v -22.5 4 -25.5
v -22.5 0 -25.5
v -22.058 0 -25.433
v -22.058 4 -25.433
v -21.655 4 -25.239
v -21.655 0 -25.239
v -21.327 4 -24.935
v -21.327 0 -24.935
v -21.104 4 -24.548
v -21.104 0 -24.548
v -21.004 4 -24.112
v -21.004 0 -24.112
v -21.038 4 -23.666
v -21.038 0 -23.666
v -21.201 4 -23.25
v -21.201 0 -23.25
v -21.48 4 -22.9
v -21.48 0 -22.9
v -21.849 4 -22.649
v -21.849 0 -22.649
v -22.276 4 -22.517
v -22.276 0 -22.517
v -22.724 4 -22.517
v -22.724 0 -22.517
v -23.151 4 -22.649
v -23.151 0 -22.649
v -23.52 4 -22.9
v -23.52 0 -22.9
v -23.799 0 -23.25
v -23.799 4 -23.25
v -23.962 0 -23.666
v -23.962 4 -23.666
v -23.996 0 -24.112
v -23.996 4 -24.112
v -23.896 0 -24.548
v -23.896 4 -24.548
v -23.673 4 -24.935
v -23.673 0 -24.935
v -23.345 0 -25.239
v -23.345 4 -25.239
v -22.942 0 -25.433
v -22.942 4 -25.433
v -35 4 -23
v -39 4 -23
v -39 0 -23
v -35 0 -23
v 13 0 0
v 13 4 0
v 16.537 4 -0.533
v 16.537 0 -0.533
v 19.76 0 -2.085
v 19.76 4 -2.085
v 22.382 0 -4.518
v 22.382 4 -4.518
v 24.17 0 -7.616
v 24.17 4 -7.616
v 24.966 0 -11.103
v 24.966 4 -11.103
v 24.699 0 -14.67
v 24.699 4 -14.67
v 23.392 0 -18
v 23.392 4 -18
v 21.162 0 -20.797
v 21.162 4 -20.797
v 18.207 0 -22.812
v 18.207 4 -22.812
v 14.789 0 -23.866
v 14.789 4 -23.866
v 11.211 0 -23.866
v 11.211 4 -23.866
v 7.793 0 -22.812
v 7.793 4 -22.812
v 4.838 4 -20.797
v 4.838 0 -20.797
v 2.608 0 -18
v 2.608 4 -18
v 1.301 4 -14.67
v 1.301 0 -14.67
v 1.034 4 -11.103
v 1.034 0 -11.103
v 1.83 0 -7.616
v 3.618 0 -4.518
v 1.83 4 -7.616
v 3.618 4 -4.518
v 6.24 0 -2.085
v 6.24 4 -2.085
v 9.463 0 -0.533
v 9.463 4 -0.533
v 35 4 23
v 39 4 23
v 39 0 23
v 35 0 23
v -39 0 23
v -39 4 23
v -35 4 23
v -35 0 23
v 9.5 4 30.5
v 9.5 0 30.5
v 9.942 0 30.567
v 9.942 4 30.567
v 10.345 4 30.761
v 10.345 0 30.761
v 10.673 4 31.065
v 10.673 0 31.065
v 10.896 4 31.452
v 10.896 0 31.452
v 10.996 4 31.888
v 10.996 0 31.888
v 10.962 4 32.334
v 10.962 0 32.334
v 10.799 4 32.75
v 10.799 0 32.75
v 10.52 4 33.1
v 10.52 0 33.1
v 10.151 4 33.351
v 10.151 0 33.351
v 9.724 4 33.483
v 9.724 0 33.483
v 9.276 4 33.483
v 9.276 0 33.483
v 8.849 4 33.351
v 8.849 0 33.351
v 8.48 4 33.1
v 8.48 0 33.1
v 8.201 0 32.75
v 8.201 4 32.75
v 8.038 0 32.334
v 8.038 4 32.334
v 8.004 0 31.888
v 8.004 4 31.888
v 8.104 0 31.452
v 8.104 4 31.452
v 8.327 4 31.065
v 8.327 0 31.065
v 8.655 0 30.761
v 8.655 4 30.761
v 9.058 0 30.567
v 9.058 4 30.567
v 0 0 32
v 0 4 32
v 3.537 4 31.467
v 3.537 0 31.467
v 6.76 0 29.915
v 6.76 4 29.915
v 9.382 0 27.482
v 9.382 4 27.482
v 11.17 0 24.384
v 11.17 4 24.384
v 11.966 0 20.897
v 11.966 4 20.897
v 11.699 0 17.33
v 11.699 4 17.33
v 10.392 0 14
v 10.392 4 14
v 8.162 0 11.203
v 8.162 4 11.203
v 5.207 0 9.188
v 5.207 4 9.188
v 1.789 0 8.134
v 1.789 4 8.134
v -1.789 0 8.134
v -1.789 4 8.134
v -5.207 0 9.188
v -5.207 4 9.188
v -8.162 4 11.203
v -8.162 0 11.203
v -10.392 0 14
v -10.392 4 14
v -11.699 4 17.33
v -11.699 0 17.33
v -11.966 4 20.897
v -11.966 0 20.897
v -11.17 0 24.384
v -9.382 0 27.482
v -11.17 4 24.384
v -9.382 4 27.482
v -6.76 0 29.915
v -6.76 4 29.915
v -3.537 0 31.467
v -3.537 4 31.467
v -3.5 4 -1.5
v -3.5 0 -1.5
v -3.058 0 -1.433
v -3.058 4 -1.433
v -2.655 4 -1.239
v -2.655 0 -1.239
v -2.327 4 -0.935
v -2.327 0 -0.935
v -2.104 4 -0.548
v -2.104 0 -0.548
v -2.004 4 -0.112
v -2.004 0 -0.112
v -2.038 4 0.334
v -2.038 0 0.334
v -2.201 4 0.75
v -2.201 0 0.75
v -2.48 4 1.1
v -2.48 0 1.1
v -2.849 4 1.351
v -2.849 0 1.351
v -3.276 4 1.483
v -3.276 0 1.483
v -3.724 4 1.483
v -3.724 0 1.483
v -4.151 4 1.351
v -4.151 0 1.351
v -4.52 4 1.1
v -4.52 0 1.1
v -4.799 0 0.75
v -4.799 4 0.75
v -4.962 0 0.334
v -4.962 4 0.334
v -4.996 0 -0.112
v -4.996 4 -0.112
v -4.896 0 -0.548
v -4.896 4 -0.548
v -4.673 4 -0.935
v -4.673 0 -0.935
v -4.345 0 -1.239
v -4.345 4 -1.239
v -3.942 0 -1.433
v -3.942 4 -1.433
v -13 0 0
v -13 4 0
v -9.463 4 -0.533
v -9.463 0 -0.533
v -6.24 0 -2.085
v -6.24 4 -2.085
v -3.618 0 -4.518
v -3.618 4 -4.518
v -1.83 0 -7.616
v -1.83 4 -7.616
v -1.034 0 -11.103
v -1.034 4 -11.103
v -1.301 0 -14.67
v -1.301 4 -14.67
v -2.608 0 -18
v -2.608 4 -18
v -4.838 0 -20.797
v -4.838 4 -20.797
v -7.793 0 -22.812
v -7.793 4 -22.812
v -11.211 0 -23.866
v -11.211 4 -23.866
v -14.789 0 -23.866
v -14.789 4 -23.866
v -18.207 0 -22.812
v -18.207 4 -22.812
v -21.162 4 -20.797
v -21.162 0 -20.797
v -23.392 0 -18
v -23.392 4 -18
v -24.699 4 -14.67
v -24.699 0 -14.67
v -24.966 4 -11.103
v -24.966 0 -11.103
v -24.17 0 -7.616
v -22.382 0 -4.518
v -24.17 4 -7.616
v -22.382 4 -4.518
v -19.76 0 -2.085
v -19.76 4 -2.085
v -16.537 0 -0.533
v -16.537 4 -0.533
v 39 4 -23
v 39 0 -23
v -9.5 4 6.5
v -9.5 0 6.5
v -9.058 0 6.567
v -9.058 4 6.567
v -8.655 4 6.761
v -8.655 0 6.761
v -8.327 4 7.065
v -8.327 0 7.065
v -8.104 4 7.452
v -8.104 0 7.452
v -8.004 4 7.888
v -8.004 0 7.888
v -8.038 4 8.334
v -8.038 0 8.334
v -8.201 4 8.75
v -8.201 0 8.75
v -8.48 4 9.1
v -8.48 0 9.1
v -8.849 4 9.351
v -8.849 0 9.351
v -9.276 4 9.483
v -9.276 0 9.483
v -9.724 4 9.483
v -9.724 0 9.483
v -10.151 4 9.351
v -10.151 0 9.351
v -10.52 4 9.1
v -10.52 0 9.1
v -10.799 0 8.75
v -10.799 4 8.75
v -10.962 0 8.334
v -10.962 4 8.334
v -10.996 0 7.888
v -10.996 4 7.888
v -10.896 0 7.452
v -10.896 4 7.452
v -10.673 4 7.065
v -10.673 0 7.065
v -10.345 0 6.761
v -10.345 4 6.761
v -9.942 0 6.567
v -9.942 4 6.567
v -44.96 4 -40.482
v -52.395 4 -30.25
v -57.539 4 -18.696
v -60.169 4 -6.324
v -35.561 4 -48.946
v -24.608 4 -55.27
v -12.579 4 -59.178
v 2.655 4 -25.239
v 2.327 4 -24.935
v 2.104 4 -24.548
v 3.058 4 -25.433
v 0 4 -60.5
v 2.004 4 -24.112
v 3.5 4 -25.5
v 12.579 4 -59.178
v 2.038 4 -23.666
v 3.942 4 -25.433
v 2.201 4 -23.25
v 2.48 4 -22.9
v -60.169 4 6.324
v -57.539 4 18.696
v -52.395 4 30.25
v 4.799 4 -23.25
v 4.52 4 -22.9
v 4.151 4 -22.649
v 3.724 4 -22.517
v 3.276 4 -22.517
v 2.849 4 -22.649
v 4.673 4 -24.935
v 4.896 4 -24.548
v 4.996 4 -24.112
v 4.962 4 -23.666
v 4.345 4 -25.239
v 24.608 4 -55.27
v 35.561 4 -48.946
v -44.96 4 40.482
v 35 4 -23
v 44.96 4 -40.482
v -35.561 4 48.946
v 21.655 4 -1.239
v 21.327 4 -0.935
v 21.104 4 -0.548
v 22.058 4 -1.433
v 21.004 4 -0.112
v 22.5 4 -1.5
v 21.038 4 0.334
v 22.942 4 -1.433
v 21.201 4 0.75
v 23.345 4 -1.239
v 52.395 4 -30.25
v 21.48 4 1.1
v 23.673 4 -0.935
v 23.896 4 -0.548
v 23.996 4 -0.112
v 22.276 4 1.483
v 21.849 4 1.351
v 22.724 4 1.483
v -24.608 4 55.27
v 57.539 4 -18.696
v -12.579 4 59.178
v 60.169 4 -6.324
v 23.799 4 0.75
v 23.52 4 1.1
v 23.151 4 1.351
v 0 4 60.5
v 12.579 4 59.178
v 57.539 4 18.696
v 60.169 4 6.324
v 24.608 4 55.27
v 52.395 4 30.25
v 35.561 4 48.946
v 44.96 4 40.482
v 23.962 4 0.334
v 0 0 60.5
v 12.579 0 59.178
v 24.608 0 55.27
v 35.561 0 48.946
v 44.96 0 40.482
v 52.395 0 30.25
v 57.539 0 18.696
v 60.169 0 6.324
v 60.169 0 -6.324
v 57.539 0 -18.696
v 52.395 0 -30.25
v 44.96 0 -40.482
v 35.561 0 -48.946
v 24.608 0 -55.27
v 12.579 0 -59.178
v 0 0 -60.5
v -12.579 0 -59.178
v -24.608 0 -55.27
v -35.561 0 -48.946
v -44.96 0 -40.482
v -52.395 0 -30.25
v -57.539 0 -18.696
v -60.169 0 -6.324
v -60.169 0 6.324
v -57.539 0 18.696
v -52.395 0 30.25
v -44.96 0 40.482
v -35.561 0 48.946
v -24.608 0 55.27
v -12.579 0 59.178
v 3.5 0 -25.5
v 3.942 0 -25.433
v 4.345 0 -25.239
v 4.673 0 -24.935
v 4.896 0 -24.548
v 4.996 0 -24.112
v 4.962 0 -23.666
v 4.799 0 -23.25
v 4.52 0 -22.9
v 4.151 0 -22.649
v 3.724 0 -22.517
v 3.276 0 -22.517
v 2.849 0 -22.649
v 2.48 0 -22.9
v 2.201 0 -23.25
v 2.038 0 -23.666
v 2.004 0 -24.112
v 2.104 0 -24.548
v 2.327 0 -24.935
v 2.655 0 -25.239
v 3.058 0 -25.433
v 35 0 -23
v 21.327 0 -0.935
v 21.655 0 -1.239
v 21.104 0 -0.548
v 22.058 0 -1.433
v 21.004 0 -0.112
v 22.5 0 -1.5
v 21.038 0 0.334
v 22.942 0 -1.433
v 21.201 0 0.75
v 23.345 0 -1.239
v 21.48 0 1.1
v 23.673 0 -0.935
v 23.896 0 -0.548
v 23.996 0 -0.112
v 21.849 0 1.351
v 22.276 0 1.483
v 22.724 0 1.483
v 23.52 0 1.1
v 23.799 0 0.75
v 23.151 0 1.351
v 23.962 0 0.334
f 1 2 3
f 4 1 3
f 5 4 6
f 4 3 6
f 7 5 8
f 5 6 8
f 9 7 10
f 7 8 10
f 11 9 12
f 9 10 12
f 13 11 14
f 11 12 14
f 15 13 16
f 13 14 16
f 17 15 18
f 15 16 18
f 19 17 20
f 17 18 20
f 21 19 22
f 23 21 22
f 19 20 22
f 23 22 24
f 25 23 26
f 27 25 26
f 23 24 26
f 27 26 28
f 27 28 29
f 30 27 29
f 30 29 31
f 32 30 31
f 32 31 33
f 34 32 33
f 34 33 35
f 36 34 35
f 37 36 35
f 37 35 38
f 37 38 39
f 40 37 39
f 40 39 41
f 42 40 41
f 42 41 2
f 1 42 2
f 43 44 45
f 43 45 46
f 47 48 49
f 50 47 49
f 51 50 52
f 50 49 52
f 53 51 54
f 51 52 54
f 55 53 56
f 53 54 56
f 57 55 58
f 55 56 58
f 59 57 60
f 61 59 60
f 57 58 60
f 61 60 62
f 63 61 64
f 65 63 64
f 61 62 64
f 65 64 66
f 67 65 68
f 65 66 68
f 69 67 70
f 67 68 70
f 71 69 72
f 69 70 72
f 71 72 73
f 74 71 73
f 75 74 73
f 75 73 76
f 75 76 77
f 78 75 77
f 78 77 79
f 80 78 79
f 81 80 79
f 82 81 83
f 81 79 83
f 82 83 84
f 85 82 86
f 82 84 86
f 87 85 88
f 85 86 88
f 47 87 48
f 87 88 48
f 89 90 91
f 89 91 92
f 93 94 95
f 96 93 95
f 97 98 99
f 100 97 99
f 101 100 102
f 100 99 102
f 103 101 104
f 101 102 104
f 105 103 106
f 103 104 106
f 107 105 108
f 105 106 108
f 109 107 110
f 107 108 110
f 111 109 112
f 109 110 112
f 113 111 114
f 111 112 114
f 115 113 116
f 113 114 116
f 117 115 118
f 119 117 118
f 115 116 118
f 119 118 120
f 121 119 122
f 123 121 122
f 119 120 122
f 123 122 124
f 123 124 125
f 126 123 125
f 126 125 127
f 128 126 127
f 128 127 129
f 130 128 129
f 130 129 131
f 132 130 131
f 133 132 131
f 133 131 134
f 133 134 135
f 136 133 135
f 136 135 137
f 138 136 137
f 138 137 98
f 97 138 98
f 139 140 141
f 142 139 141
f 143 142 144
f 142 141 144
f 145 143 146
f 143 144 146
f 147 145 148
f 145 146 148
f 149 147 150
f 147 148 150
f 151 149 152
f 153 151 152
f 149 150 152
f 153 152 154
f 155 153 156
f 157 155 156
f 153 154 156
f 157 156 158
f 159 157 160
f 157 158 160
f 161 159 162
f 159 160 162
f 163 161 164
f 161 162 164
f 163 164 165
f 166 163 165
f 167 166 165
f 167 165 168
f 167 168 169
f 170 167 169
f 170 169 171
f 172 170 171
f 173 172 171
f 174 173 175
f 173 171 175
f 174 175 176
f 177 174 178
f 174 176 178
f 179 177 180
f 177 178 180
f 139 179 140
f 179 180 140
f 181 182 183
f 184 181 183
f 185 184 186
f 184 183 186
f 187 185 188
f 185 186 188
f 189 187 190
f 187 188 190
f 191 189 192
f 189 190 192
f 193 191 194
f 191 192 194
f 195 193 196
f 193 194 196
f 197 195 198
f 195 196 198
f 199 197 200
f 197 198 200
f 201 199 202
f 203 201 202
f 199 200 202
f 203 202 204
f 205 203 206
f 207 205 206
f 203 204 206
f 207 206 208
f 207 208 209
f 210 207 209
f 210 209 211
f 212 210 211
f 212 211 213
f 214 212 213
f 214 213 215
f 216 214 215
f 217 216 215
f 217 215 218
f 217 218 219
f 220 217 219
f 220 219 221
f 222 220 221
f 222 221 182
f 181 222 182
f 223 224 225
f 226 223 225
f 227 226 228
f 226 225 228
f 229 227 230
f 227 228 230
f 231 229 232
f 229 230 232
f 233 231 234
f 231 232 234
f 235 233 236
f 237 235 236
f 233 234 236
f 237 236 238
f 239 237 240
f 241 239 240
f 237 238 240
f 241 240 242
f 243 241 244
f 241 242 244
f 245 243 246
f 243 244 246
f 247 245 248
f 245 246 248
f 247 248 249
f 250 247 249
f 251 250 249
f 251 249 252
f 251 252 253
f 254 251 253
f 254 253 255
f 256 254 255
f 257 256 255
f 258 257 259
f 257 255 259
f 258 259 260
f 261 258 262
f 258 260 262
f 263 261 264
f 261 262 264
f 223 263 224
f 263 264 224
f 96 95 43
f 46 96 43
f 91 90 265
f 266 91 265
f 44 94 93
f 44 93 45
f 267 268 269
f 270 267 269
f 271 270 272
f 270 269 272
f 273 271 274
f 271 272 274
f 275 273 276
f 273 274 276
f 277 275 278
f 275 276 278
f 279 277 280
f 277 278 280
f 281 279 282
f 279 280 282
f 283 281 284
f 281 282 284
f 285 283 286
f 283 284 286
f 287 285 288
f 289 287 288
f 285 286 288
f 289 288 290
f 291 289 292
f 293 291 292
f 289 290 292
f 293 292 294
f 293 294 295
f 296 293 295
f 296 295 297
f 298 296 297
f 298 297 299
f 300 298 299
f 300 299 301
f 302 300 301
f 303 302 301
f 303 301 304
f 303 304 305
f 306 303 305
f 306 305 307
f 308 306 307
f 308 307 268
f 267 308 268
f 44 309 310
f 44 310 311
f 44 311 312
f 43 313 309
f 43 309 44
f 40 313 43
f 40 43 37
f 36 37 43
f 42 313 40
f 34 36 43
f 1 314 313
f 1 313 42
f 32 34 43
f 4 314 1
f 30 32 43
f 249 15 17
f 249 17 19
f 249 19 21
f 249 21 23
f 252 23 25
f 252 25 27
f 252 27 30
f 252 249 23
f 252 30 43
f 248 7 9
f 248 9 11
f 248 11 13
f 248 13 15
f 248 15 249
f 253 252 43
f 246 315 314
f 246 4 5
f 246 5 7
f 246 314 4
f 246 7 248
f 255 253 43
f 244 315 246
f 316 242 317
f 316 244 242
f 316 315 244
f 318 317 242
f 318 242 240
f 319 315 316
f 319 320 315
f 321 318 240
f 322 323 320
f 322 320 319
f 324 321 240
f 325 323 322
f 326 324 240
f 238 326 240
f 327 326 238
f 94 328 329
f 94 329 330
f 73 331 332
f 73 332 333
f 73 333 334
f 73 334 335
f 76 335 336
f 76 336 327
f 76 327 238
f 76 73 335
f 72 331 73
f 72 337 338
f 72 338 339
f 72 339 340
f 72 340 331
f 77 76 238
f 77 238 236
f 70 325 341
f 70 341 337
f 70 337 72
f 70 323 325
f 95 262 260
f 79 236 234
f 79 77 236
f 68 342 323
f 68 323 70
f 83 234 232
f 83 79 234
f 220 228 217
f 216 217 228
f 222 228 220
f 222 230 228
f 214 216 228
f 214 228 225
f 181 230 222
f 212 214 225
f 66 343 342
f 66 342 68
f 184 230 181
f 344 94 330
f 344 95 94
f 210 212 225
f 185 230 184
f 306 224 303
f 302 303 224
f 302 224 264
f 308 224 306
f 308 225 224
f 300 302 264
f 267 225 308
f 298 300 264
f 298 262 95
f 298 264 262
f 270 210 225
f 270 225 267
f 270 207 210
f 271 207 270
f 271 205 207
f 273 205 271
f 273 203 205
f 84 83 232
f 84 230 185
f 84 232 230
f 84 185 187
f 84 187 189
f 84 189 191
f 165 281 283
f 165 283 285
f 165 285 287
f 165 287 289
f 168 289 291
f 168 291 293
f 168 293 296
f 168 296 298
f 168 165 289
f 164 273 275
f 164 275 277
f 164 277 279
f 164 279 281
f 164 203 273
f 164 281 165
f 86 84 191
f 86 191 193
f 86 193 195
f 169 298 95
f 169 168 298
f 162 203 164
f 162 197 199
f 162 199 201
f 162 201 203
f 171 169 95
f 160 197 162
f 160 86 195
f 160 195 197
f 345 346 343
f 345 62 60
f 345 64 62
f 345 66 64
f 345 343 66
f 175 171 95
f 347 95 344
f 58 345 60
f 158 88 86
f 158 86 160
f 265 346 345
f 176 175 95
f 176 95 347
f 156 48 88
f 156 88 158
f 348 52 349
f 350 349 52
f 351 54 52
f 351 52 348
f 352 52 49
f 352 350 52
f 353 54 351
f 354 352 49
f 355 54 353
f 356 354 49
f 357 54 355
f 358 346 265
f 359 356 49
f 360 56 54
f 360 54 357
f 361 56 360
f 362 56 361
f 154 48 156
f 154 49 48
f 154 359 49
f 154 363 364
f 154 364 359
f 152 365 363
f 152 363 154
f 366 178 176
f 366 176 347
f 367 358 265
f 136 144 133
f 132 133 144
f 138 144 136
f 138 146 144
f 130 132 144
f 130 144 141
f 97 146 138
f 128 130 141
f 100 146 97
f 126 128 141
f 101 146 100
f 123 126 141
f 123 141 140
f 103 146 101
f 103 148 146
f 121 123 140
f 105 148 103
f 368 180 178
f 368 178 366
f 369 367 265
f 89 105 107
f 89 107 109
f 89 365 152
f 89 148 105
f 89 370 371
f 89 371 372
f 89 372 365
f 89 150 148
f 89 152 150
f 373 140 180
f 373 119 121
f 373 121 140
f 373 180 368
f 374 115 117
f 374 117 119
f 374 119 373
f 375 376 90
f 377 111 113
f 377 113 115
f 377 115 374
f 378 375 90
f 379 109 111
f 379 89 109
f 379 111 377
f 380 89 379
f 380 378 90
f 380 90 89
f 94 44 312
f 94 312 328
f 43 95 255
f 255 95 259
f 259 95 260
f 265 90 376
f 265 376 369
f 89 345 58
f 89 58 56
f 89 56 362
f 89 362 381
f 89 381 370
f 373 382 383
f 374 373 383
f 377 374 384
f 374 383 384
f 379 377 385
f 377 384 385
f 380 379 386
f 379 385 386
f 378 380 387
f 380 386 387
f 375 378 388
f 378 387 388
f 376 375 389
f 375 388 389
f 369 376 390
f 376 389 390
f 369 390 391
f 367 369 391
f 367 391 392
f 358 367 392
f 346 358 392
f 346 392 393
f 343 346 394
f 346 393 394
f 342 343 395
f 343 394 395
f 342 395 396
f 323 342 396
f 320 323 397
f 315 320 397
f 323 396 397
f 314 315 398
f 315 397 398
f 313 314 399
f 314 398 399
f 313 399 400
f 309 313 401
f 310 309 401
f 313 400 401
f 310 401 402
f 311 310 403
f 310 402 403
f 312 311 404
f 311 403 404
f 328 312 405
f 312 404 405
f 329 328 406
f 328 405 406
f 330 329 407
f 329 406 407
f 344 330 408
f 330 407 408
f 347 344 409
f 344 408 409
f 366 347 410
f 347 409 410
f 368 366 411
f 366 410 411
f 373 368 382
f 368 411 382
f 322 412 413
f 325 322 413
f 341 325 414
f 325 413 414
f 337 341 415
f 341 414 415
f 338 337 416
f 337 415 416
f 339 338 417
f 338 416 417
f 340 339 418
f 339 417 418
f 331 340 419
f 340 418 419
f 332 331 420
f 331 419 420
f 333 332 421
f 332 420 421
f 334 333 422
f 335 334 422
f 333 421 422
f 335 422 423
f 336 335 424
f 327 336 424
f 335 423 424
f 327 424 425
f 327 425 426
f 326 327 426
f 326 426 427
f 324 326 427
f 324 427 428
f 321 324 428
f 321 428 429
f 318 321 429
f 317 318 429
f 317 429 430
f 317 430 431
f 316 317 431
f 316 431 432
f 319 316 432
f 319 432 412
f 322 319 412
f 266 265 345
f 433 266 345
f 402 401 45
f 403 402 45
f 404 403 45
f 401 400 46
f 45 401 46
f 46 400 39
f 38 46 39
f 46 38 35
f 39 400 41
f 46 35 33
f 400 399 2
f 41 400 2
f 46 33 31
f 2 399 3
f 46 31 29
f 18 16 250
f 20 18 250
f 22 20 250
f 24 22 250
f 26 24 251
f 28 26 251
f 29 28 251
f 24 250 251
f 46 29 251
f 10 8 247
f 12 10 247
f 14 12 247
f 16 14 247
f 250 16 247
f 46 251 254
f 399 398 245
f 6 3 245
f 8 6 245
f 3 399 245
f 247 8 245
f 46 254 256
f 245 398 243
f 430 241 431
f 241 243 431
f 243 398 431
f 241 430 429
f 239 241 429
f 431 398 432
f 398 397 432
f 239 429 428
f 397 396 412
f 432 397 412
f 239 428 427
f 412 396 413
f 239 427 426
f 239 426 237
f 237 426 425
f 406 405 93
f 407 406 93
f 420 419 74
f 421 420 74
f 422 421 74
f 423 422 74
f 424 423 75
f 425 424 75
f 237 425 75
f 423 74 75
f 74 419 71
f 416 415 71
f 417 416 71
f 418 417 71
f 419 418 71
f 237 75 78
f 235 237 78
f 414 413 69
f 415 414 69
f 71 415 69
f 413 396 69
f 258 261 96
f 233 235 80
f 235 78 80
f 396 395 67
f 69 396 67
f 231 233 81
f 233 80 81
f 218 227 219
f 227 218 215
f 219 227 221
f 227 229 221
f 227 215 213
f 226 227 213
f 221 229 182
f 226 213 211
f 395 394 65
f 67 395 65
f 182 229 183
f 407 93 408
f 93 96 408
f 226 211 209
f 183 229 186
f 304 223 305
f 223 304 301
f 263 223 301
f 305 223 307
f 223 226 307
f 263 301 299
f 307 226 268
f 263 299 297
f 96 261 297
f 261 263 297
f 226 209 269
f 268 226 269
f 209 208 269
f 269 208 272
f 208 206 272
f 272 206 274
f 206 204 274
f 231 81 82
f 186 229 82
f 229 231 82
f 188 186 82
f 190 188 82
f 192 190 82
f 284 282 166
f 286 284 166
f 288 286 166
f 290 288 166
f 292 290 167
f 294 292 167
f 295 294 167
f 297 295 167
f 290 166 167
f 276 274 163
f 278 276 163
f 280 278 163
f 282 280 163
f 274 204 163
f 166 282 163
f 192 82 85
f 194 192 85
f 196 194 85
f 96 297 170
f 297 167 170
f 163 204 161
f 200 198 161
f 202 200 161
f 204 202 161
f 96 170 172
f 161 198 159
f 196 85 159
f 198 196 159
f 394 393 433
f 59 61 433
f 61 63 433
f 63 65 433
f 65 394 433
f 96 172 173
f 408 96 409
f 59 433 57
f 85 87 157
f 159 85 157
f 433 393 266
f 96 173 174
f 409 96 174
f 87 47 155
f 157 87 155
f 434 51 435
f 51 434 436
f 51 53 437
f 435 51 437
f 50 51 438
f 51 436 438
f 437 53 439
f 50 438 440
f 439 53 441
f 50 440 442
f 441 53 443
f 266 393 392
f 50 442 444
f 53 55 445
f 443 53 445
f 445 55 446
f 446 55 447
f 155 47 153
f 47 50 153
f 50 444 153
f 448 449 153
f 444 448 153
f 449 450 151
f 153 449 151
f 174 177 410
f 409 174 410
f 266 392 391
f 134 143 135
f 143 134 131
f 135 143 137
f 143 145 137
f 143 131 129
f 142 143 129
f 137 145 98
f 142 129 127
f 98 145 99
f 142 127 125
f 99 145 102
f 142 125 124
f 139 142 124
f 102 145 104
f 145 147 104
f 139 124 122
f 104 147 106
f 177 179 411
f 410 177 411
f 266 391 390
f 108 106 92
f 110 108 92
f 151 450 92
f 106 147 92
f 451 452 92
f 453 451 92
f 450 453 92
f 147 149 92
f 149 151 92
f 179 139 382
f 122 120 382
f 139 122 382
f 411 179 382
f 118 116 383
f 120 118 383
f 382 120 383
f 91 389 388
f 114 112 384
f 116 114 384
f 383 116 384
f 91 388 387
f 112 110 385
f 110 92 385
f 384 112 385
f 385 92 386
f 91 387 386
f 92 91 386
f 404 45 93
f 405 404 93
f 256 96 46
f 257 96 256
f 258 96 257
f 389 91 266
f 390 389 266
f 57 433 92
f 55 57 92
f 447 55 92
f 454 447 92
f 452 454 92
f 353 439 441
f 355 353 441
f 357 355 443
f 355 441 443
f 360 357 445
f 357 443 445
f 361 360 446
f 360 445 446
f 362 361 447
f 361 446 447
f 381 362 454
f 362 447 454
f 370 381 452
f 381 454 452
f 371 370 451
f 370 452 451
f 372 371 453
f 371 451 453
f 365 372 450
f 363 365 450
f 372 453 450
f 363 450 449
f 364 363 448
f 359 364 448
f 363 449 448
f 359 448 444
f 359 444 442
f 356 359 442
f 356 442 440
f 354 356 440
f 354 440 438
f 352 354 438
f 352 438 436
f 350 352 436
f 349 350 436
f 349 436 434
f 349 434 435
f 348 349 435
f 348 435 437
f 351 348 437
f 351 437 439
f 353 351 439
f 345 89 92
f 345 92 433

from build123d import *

# Parameters (mm, degrees)
SKETCH1_R             = 60.5
BOSS_EXTRUDE1_DEPTH   = 4
SKETCH2_R             = 12
CUT_EXTRUDE1_DEPTH    = 4
F_3_0MM_DOWEL_HOLE1_D = 3
SKETCH6_W             = 4
SKETCH6_H             = 46
CUT_EXTRUDE2_DEPTH    = 4


with BuildPart() as part:
    # Sketch1 → Boss-Extrude1 (new body)
    with BuildSketch(Plane(origin=(0, 0, 0), x_dir=(1, 0, 0), z_dir=(0, 1, 0))):
        with Locations(Location((0, 0, 0), (0, 0, 270))):
            Circle(SKETCH1_R)
    extrude(amount=BOSS_EXTRUDE1_DEPTH)

    # Sketch2 → Cut-Extrude1 (cut)
    with BuildSketch(Plane(origin=(0, 4, 0), x_dir=(1, 0, 0), z_dir=(0, 1, 0))):
        with Locations(Location((0, -20, 0), (0, 0, 270))):
            Circle(SKETCH2_R)
        with Locations(Location((13, 12, 0), (0, 0, 270))):
            Circle(SKETCH2_R)
        with Locations(Location((-13, 12, 0), (0, 0, 270))):
            Circle(SKETCH2_R)
    extrude(amount=-CUT_EXTRUDE1_DEPTH, mode=Mode.SUBTRACT)

    # Ø3.0mm Dowel Hole1 (through all)
    with Locations(Plane(origin=(-22.5, 4, -24), x_dir=(0, 0, 1), z_dir=(0, 1, 0))):
        with Locations((0, 0), (24, 19), (0, 26), (24, 45), (32, 13), (56, 32)):
            Hole(F_3_0MM_DOWEL_HOLE1_D / 2)

    # Sketch6 → Cut-Extrude2 (cut)
    with BuildSketch(Plane(origin=(0, 4, 0), x_dir=(1, 0, 0), z_dir=(0, 1, 0))):
        with Locations((-37, 0)):
            Rectangle(SKETCH6_W, SKETCH6_H)
    cut_extrude2 = extrude(amount=-CUT_EXTRUDE2_DEPTH, mode=Mode.SUBTRACT)

    # Mirror1: Cut-Extrude2 across plane
    add(cut_extrude2.mirror(Plane(origin=(0, 0, 0), x_dir=(0, 0, 1), z_dir=(1, 0, 0))), mode=Mode.SUBTRACT)


solid = part.part
